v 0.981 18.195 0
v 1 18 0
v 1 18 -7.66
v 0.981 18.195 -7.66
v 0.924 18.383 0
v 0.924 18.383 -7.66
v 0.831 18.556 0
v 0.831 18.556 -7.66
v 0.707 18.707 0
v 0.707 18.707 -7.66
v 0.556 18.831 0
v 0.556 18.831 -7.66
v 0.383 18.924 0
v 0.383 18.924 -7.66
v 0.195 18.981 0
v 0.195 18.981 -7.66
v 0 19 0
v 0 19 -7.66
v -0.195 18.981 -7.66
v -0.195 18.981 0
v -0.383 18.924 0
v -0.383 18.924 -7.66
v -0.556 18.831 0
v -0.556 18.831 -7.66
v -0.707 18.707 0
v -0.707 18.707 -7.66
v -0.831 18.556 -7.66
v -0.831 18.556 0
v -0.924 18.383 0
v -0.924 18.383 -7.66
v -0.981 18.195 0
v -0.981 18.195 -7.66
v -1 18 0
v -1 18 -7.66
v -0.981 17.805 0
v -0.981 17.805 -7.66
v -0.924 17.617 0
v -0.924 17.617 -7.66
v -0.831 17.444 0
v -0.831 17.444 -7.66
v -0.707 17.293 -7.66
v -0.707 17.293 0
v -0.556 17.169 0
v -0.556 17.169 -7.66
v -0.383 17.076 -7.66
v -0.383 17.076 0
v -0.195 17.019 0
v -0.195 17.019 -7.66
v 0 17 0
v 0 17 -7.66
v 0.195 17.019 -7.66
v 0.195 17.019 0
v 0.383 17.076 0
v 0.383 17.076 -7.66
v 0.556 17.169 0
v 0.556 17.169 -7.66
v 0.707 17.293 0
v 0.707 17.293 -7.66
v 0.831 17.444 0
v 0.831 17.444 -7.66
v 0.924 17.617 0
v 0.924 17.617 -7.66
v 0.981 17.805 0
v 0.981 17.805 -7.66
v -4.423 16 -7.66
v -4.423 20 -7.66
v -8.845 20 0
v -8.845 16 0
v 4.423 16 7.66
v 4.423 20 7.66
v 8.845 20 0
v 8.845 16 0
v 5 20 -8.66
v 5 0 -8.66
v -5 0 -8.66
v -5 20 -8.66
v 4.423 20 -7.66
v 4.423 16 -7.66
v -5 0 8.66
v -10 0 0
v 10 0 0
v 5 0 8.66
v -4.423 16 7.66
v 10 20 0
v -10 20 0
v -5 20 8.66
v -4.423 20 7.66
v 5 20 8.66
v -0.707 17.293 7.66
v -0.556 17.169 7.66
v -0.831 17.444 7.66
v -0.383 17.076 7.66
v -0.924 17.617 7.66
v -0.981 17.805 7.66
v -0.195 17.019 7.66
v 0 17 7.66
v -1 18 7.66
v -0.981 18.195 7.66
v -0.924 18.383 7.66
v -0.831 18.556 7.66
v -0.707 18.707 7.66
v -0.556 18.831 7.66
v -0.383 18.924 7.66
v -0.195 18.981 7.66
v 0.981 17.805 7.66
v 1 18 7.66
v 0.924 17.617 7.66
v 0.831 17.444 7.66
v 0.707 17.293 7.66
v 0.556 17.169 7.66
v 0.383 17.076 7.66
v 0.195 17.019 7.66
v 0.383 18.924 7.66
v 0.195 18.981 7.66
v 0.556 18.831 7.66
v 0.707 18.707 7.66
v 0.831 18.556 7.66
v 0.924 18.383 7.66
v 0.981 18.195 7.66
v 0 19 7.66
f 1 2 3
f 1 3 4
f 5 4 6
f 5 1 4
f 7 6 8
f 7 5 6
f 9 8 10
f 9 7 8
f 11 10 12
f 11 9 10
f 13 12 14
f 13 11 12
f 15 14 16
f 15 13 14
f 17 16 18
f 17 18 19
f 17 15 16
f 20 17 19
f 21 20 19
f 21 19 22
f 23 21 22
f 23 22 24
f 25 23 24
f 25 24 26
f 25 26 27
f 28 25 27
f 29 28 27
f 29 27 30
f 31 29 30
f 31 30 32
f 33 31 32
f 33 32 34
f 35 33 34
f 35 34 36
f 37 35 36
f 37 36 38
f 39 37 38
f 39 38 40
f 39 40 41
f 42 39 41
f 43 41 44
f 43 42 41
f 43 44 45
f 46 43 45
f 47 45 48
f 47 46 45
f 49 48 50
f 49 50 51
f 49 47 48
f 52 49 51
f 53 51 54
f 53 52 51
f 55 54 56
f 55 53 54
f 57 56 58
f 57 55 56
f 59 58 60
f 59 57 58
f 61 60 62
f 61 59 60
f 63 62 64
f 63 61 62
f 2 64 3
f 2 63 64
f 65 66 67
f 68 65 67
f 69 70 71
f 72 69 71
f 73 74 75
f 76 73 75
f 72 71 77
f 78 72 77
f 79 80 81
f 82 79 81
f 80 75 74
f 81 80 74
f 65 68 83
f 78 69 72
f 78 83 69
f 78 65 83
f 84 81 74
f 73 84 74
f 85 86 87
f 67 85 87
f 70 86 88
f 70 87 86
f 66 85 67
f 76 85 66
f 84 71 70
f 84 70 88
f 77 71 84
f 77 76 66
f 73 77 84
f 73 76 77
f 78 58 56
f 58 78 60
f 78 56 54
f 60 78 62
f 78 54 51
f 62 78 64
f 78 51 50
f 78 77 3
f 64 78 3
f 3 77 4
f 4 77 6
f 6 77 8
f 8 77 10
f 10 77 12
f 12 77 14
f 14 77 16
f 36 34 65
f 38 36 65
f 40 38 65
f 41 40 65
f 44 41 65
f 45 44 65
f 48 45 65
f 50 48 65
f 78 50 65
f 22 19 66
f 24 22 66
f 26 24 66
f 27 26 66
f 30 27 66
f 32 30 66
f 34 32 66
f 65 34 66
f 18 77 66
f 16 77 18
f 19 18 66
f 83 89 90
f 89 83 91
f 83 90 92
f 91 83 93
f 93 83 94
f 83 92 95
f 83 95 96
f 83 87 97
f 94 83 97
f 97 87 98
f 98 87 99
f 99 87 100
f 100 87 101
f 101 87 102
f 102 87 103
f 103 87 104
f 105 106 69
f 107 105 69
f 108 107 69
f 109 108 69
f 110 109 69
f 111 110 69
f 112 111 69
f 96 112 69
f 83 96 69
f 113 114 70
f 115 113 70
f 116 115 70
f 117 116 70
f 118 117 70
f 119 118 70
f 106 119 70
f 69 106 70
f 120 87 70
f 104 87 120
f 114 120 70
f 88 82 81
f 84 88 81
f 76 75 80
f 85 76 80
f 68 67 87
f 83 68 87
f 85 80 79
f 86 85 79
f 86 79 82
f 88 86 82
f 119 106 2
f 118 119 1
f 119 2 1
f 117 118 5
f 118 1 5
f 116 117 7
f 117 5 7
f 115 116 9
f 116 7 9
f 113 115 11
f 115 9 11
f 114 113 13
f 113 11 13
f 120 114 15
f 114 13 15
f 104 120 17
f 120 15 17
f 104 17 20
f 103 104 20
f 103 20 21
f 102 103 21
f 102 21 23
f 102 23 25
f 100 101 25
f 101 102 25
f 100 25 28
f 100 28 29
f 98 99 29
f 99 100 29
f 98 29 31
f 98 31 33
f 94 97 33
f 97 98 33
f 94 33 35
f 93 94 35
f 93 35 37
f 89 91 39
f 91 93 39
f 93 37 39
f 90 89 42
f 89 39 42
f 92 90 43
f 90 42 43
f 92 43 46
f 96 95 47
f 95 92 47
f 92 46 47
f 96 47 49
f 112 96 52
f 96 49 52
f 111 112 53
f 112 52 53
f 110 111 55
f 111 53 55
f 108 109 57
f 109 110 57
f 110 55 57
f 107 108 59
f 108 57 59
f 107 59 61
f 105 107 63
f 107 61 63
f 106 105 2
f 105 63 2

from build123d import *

# Parameters (mm, degrees)
BOSS_EXTRUDE1_DEPTH             = 20
CUT_EXTRUDE1_DEPTH              = 4
BOSS_EXTRUDE2_REACH             = 10.66
SKETCH4_R                       = 1
BOSS_EXTRUDE2_DIRECTION_2_REACH = 10.66


with BuildPart() as part:
    # Sketch1 → Boss-Extrude1 (new body)
    with BuildSketch(Plane(origin=(0, 0, 0), x_dir=(1, 0, 0), z_dir=(0, 1, 0))):
        Polygon((10, 0), (5, 8.660254038), (-5, 8.660254038), (-10, 0), (-5, -8.660254038), (5, -8.660254038), align=None)
    extrude(amount=BOSS_EXTRUDE1_DEPTH)

    # Sketch3 → Cut-Extrude1 (cut)
    with BuildSketch(Plane(origin=(0, 20, 0), x_dir=(1, 0, 0), z_dir=(0, 1, 0))):
        Polygon((4.422649731, -7.660254038), (8.845299462, 0), (4.422649731, 7.660254038), (-4.422649731, 7.660254038), (-8.845299462, 0), (-4.422649731, -7.660254038), align=None)
    extrude(amount=-CUT_EXTRUDE1_DEPTH, mode=Mode.SUBTRACT)

    # Sketch4 → Boss-Extrude2 (add, up to next)
    with BuildSketch(Plane.XY, mode=Mode.PRIVATE) as boss_extrude2_sk1:
        with Locations((0, 18)):
            Circle(SKETCH4_R)
    boss_extrude2_tool1 = extrude(boss_extrude2_sk1.sketch, amount=BOSS_EXTRUDE2_REACH, mode=Mode.PRIVATE) - part.part
    add(boss_extrude2_tool1.solids().sort_by_distance((0, 18, 0))[0])

    # Sketch4 → Boss-Extrude2 direction 2 (add, up to next)
    with BuildSketch(Plane.XY, mode=Mode.PRIVATE) as boss_extrude2_direction_2_sk1:
        with Locations((0, 18)):
            Circle(SKETCH4_R)
    boss_extrude2_direction_2_tool1 = extrude(boss_extrude2_direction_2_sk1.sketch, amount=-BOSS_EXTRUDE2_DIRECTION_2_REACH, mode=Mode.PRIVATE) - part.part
    add(boss_extrude2_direction_2_tool1.solids().sort_by_distance((0, 18, 0))[0])


solid = part.part
